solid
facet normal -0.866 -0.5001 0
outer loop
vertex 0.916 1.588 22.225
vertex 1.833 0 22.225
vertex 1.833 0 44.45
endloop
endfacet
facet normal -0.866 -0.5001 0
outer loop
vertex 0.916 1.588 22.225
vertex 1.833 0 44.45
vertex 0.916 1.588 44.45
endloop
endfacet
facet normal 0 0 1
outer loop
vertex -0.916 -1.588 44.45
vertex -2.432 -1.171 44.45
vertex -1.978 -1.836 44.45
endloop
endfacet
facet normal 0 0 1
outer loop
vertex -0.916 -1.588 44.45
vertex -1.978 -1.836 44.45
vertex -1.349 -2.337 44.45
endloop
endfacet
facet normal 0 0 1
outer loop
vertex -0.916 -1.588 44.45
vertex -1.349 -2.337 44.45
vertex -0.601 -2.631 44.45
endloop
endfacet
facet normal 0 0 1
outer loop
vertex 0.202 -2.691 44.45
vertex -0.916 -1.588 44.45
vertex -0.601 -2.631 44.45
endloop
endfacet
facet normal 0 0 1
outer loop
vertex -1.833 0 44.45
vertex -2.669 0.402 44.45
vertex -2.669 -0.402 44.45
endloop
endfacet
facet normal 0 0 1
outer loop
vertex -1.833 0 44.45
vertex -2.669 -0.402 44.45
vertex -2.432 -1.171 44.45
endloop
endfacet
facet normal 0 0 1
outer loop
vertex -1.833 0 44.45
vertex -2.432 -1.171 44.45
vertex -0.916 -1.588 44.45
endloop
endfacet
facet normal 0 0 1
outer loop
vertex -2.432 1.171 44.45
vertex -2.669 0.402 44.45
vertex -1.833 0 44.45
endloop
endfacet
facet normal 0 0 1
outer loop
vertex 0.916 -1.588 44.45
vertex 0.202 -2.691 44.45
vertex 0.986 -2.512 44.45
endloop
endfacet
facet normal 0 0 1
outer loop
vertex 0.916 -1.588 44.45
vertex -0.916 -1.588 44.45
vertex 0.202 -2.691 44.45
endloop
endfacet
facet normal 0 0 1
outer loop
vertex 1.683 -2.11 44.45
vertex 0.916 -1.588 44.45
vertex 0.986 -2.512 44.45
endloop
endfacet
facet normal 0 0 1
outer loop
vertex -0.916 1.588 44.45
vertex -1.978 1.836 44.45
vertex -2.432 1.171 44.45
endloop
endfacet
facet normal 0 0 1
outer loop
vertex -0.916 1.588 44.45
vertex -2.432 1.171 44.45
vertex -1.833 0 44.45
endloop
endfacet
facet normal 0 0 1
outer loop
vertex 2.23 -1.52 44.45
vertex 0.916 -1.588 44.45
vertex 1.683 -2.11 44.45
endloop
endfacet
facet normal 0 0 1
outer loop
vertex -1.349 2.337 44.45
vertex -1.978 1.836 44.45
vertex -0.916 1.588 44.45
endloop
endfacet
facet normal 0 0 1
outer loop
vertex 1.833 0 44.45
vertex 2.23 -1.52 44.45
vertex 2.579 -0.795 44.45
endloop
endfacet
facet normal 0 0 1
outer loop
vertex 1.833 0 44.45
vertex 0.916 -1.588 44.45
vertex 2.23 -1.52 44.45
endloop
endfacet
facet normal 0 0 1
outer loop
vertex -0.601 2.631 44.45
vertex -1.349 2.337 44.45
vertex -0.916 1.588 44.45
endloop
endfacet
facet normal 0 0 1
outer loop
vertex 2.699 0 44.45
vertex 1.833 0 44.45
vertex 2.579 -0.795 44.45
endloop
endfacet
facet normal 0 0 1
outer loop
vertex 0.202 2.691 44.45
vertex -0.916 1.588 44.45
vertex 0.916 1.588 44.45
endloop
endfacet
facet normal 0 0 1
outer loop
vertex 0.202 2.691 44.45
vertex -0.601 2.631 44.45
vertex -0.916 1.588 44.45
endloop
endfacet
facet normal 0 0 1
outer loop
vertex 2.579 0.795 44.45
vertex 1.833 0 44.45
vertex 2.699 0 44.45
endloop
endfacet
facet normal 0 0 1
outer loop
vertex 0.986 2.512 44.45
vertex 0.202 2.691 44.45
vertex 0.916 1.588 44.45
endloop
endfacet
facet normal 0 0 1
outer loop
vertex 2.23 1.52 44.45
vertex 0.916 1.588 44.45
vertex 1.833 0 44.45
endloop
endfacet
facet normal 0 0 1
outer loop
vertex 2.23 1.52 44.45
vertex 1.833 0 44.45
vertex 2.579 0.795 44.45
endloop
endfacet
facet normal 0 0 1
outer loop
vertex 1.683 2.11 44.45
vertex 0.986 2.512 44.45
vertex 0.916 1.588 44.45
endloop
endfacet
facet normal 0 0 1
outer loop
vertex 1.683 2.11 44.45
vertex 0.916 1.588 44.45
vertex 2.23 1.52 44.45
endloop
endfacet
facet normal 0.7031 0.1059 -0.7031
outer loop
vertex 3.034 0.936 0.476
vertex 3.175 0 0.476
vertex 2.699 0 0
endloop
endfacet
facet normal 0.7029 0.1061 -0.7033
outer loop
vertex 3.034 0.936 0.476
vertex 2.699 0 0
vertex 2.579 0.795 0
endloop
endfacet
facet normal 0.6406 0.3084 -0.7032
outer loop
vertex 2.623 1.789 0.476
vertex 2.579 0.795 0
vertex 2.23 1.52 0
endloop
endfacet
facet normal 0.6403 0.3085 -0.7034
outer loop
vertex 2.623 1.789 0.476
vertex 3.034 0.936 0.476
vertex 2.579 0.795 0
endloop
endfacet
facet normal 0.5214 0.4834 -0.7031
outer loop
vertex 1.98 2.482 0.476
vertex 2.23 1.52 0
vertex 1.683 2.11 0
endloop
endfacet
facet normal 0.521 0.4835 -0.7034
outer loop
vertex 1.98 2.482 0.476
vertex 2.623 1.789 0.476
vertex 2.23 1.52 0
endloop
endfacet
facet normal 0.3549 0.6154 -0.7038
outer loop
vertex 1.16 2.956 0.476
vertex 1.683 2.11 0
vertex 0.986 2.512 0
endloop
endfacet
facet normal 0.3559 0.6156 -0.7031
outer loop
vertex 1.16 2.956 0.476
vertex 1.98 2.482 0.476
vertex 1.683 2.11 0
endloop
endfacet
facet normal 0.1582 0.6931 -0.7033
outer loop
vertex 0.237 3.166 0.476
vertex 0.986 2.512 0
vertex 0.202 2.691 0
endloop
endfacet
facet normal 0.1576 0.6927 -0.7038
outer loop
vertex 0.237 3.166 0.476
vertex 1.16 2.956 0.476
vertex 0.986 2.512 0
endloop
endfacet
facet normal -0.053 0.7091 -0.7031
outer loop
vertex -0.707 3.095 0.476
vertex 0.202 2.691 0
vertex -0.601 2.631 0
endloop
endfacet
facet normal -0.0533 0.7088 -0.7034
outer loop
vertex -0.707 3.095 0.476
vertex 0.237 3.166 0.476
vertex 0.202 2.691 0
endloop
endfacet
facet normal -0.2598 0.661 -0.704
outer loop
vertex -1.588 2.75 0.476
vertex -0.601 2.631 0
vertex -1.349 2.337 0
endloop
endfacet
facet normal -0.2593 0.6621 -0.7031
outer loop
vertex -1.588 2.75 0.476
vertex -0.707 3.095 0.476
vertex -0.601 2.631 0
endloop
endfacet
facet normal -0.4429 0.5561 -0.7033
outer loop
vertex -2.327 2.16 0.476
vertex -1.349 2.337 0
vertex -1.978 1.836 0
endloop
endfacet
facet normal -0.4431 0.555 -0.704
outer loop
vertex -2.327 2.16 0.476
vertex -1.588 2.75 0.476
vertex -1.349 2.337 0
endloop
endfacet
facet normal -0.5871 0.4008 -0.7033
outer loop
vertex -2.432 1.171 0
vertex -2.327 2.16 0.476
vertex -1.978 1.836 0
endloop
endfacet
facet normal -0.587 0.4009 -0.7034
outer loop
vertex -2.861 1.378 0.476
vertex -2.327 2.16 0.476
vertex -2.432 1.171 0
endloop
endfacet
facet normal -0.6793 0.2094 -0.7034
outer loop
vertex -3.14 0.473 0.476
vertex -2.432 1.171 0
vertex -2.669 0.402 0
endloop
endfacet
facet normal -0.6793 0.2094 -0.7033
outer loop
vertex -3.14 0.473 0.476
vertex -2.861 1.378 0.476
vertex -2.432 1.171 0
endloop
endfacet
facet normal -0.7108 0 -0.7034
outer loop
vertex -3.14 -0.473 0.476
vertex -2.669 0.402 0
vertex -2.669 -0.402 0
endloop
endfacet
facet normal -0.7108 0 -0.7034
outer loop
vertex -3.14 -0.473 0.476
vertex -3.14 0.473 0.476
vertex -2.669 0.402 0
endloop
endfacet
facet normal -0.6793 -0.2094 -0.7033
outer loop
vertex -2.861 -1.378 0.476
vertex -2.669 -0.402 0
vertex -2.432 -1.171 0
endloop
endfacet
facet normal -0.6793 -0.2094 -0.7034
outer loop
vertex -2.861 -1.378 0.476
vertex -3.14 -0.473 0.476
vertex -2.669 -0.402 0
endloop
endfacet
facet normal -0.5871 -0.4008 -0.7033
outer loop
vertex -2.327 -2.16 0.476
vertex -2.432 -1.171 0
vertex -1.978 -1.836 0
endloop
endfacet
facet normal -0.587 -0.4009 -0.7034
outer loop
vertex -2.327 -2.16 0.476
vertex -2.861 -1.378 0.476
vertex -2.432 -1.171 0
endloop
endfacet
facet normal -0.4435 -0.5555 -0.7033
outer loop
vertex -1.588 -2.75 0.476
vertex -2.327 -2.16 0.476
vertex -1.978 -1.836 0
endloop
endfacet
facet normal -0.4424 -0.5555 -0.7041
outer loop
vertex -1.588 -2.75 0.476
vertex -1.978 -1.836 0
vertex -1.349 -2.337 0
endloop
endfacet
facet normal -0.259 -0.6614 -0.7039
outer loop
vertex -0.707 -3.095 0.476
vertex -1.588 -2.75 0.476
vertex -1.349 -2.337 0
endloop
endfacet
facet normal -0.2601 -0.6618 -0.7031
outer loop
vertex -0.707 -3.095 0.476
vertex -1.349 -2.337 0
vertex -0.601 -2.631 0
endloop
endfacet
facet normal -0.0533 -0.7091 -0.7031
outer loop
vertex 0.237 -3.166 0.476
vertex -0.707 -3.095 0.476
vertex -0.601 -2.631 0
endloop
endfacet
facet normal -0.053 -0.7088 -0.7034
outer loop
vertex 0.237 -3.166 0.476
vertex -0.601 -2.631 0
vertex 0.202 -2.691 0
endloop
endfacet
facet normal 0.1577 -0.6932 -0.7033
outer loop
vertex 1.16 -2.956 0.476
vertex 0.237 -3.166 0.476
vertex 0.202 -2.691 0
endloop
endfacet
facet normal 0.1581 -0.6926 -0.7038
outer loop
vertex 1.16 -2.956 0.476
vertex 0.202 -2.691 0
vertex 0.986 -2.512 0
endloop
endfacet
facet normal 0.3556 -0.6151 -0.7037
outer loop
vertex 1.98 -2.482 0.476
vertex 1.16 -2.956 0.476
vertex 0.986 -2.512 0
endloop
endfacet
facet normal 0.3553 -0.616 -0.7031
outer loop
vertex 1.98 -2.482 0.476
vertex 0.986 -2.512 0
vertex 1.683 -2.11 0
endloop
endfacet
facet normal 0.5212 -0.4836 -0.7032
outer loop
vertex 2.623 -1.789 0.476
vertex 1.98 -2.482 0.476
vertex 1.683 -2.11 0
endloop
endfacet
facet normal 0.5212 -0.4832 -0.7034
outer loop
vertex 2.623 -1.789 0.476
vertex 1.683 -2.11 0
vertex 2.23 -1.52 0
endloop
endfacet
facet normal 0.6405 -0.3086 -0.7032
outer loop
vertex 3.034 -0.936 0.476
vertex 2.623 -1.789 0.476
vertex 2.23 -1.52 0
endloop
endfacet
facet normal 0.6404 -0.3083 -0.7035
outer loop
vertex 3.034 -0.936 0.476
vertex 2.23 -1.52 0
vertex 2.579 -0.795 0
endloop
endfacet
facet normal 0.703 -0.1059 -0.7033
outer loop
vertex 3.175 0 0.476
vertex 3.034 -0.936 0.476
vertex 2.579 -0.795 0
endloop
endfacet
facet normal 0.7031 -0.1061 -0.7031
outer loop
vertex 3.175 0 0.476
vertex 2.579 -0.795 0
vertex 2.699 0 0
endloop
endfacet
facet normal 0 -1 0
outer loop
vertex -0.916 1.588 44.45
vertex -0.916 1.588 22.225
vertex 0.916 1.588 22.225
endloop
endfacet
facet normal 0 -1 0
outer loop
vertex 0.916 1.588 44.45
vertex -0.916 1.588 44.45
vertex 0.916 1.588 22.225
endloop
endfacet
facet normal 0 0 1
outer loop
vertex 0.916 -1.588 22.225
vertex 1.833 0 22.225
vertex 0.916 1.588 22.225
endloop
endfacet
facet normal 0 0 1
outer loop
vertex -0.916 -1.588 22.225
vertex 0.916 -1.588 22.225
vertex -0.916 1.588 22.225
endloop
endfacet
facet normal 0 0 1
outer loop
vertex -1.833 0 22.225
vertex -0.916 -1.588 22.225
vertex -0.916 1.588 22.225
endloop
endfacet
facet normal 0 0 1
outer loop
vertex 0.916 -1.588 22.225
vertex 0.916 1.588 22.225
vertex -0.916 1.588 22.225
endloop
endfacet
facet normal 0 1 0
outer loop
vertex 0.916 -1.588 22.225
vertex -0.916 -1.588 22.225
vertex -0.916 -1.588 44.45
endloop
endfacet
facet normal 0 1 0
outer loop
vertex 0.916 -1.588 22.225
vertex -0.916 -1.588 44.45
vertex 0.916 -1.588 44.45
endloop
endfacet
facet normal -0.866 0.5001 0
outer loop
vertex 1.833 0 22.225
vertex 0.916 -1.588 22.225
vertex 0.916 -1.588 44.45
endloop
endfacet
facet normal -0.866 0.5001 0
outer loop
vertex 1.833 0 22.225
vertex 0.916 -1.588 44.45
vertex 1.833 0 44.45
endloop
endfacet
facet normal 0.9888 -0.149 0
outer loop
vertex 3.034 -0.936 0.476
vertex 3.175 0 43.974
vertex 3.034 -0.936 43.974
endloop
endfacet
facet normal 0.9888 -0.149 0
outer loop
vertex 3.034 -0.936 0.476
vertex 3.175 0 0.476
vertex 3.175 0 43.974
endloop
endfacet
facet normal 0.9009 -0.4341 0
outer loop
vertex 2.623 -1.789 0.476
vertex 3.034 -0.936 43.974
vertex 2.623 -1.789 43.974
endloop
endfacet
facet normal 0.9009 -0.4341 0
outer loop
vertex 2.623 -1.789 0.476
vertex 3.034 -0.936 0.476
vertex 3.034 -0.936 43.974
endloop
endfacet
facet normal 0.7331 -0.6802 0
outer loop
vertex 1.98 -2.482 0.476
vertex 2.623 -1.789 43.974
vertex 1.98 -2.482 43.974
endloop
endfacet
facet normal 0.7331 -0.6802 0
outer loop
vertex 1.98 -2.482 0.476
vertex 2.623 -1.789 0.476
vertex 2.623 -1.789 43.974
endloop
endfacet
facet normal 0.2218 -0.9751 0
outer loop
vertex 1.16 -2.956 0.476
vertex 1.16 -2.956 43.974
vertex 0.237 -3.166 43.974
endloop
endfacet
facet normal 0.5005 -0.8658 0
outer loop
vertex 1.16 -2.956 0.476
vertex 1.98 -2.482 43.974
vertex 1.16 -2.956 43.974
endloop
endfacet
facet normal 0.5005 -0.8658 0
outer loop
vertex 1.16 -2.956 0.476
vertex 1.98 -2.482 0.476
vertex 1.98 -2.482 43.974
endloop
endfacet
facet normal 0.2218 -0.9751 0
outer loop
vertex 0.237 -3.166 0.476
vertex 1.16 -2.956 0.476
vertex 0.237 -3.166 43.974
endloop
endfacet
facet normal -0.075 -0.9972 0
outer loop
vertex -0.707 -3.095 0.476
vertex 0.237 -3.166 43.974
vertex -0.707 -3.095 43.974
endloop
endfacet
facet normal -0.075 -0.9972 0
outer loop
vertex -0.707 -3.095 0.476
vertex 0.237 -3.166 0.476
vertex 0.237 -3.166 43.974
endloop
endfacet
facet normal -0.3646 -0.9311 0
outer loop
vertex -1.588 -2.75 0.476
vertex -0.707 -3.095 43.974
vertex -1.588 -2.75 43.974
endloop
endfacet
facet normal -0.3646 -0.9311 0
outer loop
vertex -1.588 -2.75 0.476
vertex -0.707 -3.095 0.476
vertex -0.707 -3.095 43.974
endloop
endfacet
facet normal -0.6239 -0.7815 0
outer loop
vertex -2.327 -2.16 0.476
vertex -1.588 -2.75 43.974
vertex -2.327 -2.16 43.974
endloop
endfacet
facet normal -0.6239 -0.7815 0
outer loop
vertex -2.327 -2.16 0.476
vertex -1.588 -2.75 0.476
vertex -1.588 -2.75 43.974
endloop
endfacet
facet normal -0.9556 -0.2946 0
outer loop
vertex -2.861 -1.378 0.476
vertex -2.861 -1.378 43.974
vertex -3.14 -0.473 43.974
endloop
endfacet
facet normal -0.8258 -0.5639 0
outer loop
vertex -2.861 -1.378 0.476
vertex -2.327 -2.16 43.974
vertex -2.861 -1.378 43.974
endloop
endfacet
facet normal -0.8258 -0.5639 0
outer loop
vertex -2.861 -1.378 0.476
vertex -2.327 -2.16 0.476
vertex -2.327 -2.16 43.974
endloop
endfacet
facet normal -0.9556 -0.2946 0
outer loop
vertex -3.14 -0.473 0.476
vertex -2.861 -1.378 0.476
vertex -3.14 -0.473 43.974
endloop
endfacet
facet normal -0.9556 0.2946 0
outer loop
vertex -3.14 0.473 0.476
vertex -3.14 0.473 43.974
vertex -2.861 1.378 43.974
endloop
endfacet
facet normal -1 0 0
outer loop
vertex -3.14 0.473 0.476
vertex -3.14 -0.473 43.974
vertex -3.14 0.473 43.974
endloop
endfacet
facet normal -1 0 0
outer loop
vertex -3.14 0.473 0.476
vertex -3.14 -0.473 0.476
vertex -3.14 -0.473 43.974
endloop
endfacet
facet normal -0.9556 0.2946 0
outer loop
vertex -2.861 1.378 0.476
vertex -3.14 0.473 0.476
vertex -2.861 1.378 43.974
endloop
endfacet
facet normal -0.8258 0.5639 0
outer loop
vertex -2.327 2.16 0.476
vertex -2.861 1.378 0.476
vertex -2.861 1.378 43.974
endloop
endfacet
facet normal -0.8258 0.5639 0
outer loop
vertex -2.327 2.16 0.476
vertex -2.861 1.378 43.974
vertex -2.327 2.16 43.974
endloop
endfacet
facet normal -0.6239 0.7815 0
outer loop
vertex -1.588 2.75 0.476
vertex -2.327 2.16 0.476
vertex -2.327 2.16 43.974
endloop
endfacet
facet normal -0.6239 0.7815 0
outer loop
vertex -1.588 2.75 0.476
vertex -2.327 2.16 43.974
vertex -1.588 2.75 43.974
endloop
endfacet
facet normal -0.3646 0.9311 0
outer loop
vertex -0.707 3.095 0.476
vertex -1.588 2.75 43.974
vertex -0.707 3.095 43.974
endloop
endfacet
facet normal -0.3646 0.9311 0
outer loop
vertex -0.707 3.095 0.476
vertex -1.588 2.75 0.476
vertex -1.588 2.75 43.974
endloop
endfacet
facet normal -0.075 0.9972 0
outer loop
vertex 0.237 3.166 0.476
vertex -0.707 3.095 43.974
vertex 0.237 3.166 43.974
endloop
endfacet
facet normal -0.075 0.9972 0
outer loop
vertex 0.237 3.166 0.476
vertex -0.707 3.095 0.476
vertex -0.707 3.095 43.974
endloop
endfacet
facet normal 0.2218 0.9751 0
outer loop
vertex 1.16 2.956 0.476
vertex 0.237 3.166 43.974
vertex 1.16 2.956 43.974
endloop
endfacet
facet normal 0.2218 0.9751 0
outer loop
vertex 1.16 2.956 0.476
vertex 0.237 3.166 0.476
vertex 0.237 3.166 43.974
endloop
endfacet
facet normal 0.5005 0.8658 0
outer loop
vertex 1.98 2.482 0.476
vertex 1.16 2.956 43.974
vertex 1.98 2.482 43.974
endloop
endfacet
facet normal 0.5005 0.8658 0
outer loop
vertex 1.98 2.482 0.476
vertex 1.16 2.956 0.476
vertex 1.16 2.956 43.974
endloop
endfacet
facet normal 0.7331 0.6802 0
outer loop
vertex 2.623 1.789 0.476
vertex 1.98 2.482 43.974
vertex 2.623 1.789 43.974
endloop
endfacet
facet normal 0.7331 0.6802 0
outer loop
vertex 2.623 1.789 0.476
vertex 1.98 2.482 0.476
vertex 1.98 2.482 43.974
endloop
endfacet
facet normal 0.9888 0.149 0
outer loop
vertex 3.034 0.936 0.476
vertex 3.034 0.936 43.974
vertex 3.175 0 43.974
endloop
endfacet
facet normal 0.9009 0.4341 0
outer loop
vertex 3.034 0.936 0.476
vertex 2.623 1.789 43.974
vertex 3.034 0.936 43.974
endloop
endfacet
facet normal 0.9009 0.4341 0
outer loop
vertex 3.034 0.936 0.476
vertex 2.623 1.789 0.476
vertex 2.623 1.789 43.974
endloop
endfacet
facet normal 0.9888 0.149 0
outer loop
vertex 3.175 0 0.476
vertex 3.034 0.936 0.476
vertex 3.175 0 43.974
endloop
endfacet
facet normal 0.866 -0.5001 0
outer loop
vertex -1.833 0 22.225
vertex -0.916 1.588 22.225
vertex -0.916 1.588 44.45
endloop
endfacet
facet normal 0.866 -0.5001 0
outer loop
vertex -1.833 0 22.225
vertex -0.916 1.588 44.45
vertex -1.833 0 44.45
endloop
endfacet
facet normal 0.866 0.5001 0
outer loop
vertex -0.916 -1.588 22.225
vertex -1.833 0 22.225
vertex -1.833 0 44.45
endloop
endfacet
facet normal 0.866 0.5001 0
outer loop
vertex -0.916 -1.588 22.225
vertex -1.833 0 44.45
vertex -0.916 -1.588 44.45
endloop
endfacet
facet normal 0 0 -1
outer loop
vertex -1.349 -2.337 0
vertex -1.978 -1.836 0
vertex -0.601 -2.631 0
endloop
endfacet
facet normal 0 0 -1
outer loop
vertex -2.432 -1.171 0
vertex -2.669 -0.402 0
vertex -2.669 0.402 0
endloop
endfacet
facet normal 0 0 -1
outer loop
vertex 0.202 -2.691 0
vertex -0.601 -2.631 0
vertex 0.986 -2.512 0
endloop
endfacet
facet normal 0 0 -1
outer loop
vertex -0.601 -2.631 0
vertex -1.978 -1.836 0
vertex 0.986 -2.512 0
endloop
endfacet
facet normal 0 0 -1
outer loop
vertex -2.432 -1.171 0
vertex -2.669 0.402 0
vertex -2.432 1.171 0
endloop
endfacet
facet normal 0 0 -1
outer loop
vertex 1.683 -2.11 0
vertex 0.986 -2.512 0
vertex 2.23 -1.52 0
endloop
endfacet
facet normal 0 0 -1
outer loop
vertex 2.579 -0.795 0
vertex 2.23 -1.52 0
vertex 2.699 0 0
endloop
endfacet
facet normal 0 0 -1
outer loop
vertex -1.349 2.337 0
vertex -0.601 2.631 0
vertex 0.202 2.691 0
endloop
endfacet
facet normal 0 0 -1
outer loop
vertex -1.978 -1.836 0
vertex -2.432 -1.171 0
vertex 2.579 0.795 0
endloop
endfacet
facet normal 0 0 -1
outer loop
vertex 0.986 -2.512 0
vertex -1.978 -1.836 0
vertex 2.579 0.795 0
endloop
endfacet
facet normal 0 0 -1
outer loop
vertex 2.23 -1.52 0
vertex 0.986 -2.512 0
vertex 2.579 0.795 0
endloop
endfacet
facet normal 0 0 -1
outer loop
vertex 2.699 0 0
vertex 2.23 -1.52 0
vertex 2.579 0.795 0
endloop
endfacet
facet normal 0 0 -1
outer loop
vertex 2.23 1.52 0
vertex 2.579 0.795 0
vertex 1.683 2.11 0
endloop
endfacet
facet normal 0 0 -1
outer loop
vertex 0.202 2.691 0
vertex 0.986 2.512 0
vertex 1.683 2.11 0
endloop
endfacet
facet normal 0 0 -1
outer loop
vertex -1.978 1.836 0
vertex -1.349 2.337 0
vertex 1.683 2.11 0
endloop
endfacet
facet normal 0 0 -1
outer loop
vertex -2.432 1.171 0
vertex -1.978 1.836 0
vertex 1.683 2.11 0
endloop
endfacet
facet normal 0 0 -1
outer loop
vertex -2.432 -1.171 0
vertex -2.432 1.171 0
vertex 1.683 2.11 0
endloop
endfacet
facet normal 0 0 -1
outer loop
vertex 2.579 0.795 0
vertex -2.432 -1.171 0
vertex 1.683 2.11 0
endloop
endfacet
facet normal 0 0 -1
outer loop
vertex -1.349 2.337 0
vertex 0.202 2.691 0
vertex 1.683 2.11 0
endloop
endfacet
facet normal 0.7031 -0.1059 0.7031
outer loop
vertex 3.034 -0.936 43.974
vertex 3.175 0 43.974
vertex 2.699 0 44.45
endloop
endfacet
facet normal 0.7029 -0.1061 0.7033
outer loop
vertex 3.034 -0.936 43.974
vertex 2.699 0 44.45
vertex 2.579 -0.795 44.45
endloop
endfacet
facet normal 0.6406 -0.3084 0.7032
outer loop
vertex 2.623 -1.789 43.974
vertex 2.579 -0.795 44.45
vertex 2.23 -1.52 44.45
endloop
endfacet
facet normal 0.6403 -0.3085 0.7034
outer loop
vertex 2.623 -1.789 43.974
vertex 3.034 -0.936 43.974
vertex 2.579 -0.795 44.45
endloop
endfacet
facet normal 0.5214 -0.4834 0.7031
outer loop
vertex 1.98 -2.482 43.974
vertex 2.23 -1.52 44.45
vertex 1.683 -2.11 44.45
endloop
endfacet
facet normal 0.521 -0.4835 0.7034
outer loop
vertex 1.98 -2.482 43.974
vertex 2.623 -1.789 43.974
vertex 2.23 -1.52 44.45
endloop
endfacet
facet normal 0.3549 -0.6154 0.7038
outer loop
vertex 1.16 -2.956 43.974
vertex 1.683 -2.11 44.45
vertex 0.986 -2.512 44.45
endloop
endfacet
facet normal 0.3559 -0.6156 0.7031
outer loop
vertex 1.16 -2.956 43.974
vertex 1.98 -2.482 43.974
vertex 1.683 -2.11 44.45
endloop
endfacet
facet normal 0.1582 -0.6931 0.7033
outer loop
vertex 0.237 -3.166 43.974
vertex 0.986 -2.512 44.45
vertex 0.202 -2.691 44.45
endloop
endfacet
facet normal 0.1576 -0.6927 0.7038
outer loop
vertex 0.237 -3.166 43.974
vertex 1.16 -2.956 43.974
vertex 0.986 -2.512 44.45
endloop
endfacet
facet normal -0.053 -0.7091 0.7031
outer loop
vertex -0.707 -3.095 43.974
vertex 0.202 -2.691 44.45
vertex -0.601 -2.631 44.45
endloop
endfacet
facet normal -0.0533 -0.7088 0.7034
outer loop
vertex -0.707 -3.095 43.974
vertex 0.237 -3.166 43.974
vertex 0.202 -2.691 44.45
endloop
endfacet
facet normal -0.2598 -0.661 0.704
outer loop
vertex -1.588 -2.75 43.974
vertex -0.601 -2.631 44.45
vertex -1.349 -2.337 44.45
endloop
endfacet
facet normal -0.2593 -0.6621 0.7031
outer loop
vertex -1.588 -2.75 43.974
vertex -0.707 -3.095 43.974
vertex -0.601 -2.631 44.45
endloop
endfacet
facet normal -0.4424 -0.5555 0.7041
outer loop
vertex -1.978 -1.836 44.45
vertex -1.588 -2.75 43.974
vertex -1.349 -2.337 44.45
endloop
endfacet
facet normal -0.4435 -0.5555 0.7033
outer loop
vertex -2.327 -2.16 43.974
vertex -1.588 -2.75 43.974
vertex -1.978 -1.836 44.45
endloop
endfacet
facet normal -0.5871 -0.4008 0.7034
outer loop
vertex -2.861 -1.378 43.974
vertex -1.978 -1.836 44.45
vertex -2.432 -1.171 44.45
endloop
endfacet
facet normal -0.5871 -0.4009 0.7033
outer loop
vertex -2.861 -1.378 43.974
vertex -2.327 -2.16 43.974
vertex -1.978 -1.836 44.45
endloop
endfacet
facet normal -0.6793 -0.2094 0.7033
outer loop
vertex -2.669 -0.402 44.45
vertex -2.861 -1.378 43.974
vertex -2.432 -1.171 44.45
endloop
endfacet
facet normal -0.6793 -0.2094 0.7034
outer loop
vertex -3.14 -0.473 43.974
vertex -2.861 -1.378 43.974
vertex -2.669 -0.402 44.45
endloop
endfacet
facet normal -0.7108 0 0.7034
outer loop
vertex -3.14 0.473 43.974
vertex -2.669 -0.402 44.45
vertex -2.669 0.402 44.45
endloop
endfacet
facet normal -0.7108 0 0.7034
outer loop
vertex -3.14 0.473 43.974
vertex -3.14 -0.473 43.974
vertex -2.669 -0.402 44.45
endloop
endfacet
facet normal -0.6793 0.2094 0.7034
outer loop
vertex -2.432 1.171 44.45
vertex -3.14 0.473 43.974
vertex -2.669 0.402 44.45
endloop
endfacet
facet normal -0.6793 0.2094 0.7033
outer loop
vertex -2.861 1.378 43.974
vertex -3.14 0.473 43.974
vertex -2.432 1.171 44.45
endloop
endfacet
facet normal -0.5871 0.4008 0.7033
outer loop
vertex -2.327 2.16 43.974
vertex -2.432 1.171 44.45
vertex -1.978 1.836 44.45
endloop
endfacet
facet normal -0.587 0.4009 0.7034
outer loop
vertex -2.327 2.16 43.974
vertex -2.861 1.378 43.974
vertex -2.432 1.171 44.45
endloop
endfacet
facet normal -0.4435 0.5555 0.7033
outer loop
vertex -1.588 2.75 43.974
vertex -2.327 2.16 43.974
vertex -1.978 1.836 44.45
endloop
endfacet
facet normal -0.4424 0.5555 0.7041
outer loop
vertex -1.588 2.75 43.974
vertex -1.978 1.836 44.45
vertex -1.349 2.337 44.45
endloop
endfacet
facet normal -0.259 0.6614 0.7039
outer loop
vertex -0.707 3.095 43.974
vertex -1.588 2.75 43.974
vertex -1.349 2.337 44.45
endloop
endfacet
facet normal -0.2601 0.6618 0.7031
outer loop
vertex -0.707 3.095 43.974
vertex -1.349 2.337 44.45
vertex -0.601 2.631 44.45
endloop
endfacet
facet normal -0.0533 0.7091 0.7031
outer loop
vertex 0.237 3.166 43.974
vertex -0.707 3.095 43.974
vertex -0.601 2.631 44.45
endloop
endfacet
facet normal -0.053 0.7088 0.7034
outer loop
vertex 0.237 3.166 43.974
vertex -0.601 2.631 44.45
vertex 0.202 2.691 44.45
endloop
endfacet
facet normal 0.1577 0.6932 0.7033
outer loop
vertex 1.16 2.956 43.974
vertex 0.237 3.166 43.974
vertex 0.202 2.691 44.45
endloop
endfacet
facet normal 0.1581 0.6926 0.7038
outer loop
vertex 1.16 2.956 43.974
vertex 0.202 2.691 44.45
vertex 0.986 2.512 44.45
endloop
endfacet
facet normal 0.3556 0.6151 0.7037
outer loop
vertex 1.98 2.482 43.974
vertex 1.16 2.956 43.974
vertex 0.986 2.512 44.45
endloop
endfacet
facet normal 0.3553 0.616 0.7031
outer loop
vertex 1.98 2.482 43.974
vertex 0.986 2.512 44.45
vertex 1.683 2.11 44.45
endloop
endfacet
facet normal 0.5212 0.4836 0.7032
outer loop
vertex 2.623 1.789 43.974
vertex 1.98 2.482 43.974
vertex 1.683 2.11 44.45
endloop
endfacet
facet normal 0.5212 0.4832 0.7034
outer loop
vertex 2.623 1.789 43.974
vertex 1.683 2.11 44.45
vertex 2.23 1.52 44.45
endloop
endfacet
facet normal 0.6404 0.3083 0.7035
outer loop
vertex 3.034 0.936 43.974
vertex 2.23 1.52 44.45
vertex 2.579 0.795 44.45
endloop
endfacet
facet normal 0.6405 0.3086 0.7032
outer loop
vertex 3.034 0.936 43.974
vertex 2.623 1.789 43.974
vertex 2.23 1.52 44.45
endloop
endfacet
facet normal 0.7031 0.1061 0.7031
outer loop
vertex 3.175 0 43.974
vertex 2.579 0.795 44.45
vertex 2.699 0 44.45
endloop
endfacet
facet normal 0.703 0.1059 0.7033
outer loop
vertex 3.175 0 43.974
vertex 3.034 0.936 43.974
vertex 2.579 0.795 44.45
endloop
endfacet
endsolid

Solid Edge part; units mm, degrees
sketch "Sketch1" plane through (0, 0, 0) normal (0, 0, 1) x (1, 0, 0)
  circle A0 centre (0, 0) radius 3.175
  dimension "D1" = 6.35
extrude "Protrusion1" add sketch "Sketch1" along normal blind 44.45
chamfer "Chamfer1" distance 0.4762 angle 45 2 edges at (-3.175, 0, 0) (-3.175, 0, 44.45)
sketch "Sketch2" plane through (0, 0, 44.45) normal (0, 0, 1) x (1, 0, 0)
  line L0 (-0.9165, 1.5875) -> (0.9165, 1.5875)
  line L1 (1.8331, 0) -> (0.9165, 1.5875)
  line L2 (0.9165, -1.5875) -> (1.8331, 0)
  line L3 (-0.9165, -1.5875) -> (0.9165, -1.5875)
  line L4 (-1.8331, 0) -> (-0.9165, -1.5875)
  line L5 (-0.9165, 1.5875) -> (-1.8331, 0)
  dimension "D1" = 3.175
extrude "Cutout1" cut sketch "Sketch2" against normal blind 22.225
properties part number "162157"
